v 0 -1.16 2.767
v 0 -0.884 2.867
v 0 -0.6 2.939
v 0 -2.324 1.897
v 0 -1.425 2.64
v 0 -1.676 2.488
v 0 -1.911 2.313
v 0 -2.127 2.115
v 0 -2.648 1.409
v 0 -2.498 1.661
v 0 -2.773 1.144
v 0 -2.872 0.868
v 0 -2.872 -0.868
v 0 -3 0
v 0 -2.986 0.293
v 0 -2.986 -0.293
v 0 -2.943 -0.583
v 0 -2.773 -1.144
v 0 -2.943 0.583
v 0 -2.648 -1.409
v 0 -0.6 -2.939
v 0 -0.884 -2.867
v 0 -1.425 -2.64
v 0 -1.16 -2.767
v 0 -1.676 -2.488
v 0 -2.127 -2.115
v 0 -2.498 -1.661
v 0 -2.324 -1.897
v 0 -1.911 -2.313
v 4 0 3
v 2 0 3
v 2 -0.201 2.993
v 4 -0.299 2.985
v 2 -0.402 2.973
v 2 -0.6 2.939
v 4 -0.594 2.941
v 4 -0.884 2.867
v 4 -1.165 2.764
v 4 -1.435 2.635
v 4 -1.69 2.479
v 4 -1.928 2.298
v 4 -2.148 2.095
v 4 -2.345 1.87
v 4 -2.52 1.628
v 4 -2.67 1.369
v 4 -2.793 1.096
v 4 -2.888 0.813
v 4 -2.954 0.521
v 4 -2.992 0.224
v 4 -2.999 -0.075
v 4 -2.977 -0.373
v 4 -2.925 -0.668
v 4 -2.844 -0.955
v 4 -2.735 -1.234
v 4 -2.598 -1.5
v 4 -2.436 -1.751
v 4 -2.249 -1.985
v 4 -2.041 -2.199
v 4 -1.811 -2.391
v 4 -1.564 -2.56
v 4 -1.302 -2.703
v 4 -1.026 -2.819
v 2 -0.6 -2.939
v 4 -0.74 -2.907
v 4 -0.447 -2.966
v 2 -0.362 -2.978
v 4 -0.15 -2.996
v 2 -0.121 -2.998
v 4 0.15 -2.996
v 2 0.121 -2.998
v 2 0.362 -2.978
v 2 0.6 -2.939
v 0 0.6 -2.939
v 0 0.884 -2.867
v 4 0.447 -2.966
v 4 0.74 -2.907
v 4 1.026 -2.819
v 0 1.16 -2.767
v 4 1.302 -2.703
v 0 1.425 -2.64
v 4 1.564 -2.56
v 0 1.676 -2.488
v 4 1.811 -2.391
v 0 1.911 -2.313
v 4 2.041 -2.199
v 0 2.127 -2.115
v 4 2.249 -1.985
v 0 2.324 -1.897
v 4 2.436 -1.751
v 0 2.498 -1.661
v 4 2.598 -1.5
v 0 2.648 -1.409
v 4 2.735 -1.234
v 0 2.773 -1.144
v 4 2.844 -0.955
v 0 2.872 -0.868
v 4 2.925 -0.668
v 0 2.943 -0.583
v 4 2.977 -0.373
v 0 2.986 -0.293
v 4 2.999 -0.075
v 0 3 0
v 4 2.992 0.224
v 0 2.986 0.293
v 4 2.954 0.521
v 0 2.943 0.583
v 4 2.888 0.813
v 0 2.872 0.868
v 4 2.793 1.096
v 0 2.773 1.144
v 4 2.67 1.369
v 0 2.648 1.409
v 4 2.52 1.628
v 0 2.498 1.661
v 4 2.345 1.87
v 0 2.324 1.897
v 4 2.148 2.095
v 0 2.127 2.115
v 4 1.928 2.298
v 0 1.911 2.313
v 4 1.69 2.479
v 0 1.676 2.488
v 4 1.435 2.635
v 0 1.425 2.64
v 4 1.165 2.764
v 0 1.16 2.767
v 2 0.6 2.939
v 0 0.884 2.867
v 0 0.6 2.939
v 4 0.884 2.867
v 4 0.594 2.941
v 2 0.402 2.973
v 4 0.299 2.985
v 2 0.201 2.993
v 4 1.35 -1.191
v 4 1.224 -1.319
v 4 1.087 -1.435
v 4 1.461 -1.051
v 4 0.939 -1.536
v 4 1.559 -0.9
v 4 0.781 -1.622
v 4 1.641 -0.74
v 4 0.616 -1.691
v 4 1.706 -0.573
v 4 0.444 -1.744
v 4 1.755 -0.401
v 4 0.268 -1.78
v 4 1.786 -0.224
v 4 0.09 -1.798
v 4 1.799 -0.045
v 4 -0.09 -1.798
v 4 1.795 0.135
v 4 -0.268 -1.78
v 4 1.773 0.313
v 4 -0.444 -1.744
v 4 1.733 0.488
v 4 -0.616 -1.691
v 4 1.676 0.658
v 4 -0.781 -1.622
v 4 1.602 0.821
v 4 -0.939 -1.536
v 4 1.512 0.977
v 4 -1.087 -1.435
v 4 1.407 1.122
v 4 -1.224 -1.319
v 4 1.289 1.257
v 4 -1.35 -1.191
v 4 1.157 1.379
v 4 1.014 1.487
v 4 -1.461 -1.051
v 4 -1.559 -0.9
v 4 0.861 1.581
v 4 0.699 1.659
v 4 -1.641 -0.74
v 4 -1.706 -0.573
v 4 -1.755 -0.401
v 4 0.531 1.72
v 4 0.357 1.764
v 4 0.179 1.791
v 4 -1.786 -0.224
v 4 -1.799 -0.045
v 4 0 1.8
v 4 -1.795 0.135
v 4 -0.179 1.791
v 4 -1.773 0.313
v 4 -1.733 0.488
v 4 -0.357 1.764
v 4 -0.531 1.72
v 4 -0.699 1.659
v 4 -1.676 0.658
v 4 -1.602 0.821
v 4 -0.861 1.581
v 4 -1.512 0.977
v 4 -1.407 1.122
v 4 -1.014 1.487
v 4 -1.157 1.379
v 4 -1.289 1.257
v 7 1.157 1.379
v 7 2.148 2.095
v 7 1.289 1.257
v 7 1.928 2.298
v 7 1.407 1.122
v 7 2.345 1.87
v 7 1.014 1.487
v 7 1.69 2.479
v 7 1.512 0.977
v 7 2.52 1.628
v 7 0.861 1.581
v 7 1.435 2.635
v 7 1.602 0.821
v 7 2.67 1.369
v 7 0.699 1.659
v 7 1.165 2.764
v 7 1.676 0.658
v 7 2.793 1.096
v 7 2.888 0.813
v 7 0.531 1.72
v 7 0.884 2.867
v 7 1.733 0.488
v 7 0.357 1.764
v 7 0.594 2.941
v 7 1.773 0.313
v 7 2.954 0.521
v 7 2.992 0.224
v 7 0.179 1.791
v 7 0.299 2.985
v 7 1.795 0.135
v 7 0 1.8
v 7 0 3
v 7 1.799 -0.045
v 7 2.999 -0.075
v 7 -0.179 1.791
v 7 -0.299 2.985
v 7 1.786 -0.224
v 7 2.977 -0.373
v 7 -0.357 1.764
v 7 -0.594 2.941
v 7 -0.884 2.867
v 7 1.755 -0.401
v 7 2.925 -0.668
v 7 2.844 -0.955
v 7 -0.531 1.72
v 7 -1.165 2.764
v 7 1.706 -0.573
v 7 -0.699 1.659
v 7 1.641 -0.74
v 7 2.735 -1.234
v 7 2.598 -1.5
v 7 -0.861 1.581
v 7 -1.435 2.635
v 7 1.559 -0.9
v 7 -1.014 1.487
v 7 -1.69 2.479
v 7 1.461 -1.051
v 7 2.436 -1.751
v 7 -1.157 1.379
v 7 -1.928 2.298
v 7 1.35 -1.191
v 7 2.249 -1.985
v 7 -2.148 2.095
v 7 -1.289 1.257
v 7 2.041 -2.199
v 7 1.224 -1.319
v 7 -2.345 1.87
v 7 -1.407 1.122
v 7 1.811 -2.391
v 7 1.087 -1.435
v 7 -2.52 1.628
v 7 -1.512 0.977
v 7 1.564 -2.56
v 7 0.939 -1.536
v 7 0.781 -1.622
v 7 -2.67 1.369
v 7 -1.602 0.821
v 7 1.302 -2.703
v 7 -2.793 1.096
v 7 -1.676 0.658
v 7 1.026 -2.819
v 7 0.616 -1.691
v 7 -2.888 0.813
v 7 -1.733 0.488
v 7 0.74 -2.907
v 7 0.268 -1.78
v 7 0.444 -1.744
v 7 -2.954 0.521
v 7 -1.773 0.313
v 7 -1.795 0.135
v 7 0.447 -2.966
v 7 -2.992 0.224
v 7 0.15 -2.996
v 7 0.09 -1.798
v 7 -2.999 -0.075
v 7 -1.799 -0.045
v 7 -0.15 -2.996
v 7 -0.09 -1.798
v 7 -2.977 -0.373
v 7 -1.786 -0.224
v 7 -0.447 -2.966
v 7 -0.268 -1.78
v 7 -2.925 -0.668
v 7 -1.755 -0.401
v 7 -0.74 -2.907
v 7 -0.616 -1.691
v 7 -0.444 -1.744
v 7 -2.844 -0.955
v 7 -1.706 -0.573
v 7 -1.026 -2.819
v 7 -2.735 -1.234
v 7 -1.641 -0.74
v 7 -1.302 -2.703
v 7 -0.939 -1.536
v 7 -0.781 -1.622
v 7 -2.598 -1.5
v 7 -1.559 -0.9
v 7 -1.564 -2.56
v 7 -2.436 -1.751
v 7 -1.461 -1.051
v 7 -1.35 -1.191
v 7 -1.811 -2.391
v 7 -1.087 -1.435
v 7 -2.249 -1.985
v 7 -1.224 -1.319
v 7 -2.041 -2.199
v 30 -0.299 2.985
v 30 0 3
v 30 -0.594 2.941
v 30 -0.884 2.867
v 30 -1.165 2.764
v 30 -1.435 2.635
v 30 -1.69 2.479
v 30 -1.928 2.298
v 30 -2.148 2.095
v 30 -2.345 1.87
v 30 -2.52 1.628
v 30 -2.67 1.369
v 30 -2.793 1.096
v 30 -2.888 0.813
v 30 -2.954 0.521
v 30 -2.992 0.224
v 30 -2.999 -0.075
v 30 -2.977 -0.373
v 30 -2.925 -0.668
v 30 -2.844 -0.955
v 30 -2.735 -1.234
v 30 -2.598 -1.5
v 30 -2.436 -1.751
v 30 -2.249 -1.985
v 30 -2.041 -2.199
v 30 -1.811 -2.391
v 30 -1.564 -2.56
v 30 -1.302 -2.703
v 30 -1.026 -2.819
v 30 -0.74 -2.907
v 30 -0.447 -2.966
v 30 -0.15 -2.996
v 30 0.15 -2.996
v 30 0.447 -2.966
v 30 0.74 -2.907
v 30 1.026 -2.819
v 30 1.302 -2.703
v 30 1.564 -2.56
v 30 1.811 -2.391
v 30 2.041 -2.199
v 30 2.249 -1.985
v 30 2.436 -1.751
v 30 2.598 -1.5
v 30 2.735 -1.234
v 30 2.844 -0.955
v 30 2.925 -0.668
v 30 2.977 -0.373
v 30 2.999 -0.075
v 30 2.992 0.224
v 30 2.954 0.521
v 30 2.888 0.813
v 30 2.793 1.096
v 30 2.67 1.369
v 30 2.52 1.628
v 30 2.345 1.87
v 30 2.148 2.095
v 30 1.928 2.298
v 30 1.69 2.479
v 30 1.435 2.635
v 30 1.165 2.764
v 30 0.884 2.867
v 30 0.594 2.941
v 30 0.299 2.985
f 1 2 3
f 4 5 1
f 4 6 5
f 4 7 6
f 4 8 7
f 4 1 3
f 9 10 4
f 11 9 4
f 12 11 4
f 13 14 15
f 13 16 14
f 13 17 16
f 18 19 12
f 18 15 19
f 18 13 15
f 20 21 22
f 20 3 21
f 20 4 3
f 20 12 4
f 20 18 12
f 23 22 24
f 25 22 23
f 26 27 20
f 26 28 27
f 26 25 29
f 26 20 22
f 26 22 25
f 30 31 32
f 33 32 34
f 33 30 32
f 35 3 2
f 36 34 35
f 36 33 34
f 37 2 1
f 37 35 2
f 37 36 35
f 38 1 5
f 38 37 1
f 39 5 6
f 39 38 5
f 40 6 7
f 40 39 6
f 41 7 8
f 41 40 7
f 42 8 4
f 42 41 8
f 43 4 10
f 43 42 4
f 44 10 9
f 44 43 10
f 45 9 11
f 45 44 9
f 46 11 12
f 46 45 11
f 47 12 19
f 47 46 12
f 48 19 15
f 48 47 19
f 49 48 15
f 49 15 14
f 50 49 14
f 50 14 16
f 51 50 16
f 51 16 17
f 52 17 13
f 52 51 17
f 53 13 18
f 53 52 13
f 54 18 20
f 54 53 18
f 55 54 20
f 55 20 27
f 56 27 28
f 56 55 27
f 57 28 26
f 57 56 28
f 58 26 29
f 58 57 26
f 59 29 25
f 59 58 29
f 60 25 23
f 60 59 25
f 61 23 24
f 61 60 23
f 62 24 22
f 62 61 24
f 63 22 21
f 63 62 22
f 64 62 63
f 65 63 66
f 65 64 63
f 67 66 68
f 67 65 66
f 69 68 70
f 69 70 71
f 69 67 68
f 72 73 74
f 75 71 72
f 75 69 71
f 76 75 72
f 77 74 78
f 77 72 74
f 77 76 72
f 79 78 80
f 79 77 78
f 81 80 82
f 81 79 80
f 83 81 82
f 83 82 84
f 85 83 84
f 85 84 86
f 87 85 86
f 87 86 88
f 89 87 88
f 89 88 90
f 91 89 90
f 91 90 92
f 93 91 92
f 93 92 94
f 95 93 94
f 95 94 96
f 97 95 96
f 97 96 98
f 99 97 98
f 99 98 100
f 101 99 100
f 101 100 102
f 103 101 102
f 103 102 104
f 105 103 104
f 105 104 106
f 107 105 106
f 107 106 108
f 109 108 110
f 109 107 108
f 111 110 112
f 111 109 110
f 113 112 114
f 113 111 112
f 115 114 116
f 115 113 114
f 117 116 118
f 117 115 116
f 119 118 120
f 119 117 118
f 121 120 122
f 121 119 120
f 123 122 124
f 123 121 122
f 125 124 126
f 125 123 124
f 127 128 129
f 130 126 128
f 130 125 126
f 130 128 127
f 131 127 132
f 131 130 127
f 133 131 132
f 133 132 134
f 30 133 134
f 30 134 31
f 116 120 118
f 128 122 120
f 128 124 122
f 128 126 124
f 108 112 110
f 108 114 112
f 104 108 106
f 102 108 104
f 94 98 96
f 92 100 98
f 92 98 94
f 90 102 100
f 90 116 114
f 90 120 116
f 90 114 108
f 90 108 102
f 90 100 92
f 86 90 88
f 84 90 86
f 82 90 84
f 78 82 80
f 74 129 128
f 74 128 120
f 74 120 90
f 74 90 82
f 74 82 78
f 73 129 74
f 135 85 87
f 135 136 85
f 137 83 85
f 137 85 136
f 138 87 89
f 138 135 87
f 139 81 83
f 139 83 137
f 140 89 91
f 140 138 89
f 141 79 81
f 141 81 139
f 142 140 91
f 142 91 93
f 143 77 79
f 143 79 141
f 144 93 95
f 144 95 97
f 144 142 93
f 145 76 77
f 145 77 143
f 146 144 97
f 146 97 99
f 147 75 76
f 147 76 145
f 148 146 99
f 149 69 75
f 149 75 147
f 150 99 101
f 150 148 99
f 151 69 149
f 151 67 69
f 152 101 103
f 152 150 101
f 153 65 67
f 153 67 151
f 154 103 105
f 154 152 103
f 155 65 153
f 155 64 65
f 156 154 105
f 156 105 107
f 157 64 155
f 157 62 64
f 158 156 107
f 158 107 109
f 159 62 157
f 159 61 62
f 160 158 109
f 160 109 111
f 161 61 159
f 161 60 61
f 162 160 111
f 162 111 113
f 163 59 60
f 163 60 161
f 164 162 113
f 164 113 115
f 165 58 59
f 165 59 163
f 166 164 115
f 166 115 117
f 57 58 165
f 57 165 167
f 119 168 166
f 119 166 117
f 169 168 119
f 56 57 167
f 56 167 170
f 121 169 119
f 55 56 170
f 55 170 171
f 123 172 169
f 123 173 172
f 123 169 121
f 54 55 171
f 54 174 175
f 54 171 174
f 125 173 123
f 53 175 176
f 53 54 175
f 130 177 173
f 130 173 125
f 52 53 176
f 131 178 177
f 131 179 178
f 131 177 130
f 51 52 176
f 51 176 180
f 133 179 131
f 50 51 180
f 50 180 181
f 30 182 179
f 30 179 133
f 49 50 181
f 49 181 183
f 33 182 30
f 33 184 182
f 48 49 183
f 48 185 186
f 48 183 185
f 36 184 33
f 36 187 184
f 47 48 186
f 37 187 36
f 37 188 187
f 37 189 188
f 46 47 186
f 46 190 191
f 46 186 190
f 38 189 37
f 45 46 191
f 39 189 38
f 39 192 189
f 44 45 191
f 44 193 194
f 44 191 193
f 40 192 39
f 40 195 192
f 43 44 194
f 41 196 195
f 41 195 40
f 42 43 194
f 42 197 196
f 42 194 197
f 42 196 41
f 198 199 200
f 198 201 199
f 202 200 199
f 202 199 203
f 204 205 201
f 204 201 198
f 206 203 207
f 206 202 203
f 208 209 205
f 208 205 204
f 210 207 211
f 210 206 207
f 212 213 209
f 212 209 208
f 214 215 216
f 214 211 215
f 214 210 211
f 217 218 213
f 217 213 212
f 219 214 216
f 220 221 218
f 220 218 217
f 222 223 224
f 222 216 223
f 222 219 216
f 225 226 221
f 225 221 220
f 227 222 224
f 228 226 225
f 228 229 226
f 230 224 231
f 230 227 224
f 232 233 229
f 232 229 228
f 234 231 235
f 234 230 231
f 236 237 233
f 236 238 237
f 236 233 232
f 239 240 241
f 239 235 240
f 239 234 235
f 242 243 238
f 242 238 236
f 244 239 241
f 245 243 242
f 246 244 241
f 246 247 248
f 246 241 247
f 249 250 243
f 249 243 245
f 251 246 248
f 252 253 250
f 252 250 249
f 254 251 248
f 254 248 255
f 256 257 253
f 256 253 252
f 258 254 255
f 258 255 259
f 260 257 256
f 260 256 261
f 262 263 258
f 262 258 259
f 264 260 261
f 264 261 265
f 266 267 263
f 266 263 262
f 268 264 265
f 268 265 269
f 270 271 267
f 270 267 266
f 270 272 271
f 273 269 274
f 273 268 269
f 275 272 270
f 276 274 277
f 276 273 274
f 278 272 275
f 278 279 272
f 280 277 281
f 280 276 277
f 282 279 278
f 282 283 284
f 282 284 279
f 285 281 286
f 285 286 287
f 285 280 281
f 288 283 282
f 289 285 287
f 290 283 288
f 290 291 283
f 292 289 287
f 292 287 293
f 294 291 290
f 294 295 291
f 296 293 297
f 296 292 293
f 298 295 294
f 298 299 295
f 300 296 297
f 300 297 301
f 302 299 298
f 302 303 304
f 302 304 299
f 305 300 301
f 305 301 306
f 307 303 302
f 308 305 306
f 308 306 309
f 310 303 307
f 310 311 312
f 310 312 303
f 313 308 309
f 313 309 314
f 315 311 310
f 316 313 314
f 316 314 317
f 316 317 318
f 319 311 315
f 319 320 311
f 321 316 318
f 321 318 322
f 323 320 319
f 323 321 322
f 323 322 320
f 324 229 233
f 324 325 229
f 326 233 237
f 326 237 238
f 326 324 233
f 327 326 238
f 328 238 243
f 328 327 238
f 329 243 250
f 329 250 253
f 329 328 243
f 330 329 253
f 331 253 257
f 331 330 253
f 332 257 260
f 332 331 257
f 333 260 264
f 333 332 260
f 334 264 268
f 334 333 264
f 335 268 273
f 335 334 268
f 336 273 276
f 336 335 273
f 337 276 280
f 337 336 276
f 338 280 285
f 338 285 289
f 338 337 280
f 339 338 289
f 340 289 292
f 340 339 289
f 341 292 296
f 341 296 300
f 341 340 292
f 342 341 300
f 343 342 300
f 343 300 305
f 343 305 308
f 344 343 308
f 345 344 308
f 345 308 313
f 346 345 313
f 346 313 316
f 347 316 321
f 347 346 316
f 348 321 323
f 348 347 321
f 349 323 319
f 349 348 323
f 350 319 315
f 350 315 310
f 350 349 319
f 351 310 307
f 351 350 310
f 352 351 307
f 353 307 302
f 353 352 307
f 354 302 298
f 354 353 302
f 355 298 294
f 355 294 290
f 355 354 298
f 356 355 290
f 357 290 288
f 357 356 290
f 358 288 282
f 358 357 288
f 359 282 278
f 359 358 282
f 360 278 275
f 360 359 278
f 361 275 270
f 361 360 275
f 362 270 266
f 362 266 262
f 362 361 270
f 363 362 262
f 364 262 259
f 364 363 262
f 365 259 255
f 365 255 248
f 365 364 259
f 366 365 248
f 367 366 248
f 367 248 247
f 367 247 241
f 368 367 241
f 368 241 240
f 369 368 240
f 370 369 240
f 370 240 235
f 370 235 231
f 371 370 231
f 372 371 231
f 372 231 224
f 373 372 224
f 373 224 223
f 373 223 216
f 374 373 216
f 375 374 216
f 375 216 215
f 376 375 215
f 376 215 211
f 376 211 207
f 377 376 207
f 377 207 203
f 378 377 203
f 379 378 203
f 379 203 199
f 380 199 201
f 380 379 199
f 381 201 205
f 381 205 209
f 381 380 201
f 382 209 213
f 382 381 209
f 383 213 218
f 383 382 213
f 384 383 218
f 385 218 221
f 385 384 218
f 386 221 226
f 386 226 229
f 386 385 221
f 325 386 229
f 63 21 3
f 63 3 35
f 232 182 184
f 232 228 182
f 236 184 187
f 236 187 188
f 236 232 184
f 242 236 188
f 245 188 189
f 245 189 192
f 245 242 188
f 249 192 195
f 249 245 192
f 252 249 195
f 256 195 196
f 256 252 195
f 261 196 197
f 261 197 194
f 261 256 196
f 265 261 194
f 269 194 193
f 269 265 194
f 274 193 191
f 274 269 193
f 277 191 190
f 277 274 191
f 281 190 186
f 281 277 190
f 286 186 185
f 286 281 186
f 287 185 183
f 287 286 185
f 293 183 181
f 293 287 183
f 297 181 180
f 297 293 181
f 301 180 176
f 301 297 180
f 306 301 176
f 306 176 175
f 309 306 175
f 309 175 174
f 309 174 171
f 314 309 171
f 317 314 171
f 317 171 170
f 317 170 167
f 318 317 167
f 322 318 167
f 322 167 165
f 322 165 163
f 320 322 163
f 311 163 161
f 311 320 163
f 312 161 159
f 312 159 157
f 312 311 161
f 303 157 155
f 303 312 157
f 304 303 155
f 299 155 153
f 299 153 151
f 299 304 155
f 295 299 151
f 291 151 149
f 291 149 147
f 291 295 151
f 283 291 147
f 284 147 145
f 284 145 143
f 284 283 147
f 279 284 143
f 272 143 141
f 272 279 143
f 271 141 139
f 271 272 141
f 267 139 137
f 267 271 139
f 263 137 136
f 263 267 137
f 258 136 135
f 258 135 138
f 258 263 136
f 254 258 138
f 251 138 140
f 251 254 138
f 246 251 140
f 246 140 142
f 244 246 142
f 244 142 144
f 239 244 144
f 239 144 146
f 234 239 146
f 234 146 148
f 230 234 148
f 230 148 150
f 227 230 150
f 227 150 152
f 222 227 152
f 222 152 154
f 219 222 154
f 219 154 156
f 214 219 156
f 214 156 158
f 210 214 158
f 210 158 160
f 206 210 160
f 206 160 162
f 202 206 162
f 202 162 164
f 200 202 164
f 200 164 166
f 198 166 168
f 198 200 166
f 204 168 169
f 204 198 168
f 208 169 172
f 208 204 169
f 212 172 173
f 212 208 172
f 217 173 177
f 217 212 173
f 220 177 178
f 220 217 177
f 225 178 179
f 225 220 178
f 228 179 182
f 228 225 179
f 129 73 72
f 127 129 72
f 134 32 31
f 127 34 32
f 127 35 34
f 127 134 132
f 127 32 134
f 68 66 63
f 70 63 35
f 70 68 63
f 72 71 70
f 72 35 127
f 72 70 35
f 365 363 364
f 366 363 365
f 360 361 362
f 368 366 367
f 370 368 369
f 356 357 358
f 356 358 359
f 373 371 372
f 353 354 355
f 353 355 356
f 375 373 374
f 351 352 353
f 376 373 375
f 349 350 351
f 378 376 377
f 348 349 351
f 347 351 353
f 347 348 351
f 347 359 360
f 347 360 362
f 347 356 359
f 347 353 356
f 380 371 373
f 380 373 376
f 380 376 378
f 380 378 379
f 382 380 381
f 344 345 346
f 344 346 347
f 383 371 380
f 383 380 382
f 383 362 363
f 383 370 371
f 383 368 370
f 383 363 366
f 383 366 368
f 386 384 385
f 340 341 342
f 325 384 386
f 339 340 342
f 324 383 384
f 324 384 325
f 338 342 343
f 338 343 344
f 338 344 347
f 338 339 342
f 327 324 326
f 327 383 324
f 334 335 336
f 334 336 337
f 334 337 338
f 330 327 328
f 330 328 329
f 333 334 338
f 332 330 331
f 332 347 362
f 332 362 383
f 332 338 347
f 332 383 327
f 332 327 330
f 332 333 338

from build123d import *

# Parameters (mm, degrees)
CUT_EXTRUDE1_DEPTH      = 31.298514815
CUT_EXTRUDE1_DEPTH_BACK = 31.298514815
SKETCH2_W               = 2
SKETCH2_H               = 1.2


with BuildPart() as part:
    # Sketch1 → Revolve1 (revolve)
    with BuildSketch(Plane.XY, mode=Mode.PRIVATE) as revolve1_sk:
        Polygon((4, 3), (4, 1.8), (7, 1.8), (7, 3), (30, 3), (30, 0), (0, 0), (0, 3), align=None)
    revolve(revolve1_sk.sketch.rotate(Axis((0, 0, 0), (1, 0, 0)), 90), axis=Axis((0, 0, 0), (1, 0, 0)))

    # Sketch2 → Cut-Extrude1 (cut, two sides: drawn at the far end of the back side and taken through both)
    with BuildSketch(Plane.XY.offset(-CUT_EXTRUDE1_DEPTH_BACK)):
        with Locations((1, 0)):
            Rectangle(SKETCH2_W, SKETCH2_H)
    extrude(amount=CUT_EXTRUDE1_DEPTH + CUT_EXTRUDE1_DEPTH_BACK, mode=Mode.SUBTRACT)


solid = part.part
